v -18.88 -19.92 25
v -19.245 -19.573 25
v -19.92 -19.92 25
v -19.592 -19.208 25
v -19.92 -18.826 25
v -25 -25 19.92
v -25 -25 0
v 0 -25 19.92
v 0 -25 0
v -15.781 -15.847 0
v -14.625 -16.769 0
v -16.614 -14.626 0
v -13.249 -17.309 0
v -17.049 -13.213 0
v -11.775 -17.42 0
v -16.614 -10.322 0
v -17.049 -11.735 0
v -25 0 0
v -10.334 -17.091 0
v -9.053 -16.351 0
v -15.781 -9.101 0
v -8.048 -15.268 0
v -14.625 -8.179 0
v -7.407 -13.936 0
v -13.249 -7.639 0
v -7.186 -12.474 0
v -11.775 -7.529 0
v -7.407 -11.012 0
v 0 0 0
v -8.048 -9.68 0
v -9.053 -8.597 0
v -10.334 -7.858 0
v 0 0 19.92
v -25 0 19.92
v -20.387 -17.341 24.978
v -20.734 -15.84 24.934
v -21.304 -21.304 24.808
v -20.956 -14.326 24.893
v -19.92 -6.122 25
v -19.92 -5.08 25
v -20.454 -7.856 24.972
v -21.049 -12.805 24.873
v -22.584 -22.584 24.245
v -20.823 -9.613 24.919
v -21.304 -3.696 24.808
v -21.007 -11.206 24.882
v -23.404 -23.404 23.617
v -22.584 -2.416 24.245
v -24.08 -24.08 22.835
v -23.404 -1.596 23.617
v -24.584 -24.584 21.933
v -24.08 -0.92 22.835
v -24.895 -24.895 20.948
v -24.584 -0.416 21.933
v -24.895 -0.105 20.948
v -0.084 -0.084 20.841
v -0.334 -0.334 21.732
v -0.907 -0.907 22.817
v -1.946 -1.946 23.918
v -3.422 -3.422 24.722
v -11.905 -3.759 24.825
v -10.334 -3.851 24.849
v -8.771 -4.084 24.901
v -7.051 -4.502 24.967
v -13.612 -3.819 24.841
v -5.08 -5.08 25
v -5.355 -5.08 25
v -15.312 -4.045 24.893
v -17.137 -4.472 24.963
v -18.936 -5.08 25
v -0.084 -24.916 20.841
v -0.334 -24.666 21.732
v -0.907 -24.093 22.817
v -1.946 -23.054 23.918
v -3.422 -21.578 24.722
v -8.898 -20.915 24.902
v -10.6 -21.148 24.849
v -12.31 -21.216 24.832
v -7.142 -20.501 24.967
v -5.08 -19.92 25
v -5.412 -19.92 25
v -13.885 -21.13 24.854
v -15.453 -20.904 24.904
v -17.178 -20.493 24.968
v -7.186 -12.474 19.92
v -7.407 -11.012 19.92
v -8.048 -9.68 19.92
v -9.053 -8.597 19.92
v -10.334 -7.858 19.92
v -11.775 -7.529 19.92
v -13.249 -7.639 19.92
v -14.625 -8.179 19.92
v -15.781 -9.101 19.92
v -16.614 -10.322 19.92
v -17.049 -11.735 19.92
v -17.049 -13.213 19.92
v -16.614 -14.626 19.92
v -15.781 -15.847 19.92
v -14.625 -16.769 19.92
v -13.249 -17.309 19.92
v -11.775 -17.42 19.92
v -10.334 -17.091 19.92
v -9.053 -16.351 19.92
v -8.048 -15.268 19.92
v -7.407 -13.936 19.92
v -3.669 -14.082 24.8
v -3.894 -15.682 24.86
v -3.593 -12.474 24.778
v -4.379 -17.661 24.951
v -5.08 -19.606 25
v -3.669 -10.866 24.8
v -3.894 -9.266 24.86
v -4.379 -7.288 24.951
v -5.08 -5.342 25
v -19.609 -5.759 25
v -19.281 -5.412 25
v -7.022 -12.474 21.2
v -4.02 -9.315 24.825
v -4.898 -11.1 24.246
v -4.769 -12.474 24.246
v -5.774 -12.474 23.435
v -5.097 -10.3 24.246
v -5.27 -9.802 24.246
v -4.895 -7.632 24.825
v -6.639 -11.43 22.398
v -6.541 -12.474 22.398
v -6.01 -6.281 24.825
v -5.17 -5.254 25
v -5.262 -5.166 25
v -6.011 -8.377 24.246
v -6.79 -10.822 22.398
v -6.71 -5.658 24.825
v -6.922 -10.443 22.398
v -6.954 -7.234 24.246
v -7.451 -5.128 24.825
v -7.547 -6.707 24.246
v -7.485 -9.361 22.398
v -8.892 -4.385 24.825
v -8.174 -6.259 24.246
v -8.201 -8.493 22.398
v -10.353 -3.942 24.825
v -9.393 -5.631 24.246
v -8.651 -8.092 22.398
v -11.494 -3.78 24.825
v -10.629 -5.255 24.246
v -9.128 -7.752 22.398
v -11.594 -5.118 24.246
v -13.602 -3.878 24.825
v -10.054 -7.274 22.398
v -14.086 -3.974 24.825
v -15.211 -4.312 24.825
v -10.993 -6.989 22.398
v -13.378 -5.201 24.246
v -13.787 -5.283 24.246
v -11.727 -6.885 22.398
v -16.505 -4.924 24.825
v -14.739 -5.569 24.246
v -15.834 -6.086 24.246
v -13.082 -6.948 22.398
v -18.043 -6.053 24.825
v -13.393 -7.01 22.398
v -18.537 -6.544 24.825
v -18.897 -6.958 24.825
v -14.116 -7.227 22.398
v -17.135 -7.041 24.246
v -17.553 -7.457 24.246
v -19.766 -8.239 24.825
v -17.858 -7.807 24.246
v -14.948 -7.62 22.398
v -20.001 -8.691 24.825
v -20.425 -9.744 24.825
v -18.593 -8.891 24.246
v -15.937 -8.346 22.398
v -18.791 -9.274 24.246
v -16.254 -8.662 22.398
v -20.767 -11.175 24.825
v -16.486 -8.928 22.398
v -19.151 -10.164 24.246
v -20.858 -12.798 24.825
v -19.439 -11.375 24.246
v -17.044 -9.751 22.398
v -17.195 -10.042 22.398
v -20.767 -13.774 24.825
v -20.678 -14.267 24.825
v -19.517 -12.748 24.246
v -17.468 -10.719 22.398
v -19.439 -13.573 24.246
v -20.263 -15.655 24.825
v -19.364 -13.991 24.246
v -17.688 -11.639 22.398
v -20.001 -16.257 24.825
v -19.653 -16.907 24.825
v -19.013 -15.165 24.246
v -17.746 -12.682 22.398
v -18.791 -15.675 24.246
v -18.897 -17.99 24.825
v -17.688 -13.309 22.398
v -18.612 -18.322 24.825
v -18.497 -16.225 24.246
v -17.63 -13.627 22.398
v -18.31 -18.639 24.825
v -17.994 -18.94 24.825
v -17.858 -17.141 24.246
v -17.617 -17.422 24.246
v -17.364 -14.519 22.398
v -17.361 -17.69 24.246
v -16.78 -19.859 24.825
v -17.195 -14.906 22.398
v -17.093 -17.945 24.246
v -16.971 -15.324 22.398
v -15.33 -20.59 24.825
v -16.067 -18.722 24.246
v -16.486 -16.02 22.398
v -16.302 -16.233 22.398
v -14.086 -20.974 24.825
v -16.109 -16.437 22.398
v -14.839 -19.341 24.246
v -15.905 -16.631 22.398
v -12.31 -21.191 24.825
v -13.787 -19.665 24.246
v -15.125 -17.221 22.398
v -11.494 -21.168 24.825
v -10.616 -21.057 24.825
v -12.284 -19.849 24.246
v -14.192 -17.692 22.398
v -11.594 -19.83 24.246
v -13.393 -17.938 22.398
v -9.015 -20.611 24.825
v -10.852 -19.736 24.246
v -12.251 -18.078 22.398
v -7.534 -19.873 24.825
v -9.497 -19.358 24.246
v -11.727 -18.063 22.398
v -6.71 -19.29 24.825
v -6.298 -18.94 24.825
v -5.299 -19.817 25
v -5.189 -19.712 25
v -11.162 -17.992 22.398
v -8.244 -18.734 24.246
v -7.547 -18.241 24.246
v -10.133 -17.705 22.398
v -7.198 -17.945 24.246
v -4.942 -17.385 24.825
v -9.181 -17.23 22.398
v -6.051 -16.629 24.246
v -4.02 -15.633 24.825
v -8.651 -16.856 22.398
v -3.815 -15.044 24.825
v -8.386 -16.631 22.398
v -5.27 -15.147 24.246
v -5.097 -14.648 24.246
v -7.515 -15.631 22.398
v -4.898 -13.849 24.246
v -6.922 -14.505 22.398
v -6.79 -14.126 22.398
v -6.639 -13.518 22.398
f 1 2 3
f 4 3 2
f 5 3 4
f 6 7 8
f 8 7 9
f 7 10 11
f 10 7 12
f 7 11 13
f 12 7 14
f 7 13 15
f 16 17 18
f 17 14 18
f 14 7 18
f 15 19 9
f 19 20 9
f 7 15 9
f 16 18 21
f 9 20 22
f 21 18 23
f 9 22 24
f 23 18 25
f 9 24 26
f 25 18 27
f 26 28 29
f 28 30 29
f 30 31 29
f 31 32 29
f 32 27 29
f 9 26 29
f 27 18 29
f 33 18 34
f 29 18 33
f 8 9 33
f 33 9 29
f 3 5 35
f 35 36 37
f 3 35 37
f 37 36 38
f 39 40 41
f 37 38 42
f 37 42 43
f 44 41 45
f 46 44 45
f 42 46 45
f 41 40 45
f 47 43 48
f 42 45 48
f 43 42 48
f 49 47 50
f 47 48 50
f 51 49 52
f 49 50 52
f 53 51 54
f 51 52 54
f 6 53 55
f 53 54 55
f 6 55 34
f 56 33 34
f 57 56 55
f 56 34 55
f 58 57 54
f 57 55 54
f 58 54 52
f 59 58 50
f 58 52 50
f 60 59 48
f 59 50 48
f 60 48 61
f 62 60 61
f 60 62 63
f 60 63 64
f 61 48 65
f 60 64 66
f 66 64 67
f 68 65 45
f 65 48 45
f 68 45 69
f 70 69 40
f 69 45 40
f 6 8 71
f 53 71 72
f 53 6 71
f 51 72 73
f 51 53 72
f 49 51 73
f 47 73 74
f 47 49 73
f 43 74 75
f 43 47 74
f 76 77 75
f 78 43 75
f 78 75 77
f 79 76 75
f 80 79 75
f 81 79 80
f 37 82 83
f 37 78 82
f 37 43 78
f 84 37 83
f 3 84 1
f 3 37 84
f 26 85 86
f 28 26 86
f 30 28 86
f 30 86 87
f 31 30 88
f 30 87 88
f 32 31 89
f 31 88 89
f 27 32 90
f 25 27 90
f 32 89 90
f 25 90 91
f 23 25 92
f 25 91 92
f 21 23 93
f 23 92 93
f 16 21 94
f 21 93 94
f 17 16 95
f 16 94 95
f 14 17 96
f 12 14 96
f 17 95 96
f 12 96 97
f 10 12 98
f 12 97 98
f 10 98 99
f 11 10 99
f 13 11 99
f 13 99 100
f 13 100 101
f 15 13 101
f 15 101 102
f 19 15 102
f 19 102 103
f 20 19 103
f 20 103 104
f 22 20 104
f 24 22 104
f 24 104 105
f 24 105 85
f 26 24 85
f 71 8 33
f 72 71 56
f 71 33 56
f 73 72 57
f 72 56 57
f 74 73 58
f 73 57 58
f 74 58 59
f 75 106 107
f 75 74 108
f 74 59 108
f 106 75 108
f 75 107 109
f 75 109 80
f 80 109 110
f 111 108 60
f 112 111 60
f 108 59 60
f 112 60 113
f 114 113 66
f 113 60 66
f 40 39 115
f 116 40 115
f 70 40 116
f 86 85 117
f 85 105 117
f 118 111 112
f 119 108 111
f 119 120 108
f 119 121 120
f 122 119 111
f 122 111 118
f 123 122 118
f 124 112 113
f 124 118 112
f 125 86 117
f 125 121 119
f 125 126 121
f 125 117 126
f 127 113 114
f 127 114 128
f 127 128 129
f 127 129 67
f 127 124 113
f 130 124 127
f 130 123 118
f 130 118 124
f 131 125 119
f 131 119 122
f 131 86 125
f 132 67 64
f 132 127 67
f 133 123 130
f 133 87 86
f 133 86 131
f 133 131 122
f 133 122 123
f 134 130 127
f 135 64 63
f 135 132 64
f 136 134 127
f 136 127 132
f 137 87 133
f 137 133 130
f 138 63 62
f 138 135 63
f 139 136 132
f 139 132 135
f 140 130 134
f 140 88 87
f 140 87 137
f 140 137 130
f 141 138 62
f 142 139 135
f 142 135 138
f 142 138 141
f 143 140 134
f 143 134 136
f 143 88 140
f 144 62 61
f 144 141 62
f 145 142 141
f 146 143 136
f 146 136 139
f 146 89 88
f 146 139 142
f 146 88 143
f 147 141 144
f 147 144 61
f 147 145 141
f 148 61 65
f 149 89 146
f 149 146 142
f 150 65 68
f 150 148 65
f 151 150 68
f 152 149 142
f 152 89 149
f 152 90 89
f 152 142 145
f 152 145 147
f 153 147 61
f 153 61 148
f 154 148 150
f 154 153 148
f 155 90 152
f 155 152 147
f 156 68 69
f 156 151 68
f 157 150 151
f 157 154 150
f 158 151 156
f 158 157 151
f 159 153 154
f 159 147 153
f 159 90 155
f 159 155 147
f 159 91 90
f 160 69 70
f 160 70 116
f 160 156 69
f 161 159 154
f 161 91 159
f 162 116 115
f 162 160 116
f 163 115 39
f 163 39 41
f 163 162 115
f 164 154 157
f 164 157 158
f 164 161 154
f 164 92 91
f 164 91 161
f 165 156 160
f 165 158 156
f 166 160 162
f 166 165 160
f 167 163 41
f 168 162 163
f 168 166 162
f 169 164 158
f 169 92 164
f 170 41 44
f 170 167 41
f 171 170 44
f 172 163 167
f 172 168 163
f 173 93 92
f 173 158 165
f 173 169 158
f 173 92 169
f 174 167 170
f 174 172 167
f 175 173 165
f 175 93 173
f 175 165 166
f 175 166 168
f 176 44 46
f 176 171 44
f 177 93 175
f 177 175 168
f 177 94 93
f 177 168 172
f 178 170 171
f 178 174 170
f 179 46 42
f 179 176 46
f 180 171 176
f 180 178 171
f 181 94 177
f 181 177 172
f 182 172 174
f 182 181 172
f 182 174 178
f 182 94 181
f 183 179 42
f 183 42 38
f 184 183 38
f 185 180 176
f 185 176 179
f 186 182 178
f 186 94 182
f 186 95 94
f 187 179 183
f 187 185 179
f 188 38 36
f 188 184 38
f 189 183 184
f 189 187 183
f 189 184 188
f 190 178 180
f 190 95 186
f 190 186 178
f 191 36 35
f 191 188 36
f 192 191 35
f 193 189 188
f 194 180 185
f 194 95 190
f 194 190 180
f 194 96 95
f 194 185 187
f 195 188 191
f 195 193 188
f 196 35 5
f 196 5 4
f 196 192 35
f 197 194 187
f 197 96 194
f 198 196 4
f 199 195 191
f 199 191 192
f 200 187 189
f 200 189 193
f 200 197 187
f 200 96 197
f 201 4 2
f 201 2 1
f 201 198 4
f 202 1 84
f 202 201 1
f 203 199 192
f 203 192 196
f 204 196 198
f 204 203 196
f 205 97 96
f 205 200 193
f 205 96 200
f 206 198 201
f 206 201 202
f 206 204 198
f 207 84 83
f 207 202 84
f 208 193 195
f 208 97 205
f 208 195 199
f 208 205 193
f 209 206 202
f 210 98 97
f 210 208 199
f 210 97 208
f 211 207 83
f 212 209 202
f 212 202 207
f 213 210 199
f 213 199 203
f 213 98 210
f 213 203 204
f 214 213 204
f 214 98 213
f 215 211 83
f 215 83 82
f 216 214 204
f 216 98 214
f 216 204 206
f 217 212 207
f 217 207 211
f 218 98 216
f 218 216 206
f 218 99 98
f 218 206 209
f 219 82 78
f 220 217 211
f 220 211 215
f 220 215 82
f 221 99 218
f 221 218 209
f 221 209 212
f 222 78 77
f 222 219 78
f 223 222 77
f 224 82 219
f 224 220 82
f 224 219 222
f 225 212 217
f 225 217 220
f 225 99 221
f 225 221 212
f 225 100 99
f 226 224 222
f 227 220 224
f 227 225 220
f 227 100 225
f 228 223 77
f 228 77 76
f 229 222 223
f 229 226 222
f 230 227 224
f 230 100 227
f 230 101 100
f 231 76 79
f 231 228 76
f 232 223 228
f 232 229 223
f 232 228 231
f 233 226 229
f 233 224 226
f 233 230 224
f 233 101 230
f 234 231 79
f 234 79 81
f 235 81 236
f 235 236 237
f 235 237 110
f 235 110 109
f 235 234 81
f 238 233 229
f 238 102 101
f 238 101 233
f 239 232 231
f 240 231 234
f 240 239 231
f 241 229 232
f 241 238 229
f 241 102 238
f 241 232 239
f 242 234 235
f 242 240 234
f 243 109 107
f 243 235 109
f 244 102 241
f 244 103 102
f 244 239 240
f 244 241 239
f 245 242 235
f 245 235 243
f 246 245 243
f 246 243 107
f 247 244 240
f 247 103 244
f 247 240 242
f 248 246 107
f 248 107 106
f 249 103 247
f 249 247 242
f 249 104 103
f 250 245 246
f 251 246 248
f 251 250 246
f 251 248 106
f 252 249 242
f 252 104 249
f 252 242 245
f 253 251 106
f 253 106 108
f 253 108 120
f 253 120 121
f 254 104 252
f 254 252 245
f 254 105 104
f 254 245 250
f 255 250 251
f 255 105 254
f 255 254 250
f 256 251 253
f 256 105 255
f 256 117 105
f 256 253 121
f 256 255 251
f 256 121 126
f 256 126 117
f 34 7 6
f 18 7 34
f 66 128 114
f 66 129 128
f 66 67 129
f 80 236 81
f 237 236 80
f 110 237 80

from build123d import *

# Parameters (mm, degrees)
F0_W        = 25
F0_H        = 25
F1_DEPTH    = 25
F2_R        = 4.9593089968
F3_DEPTH    = 25.4
F4_T1_DEPTH = 50.4
F4_T3_DEPTH = 50.4


# Not quite as in the source:
# - a fillet or chamfer that OpenCascade refuses, or shapes differently, is made with other operations: its cross-section is extruded or revolved along the edge and cut away or added


with BuildPart() as f1:
    # F0 (on Top) → F1 (new body)
    with BuildSketch(Plane.XY):
        with Locations((-12.5, -12.5)):
            Rectangle(F0_W, F0_H)
    extrude(amount=F1_DEPTH)

    # F2 (on face) → F3 (cut)
    with BuildSketch(Plane.XY.offset(25)):
        with Locations((-12.1455704793, -12.4741084874)):
            Circle(F2_R)
    extrude(amount=-F3_DEPTH, mode=Mode.SUBTRACT)

    # F4: fillet of radius 5.08 on 5 edges, made by hand

    # F4_s2 → F4_t1 (cut)
    with BuildSketch(Plane.XZ.offset(-12.7)):
        with BuildLine():
            ThreePointArc((0, 19.92), (-1.4878975516, 23.5121024484), (-5.08, 25))
            Line((-5.08, 25), (0, 25))
            Line((0, 25), (0, 19.92))
        make_face()
        with BuildLine():
            ThreePointArc((-19.92, 25), (-23.5121024484, 23.5121024484), (-25, 19.92))
            Line((-25, 19.92), (-25, 25))
            Line((-25, 25), (-19.92, 25))
        make_face()
    extrude(amount=F4_T1_DEPTH, mode=Mode.SUBTRACT)

    # F4_s4 → F4_t3 (cut)
    with BuildSketch(Plane.YZ.offset(-37.7)):
        with BuildLine():
            ThreePointArc((-25, 19.92), (-23.5121024484, 23.5121024484), (-19.92, 25))
            Line((-19.92, 25), (-25, 25))
            Line((-25, 25), (-25, 19.92))
        make_face()
        with BuildLine():
            ThreePointArc((0, 19.92), (-1.4878975516, 23.5121024484), (-5.08, 25))
            Line((-5.08, 25), (0, 25))
            Line((0, 25), (0, 19.92))
        make_face()
    extrude(amount=F4_T3_DEPTH, mode=Mode.SUBTRACT)

    # F4_s5 → F4_t6 (revolve, cut)
    with BuildSketch(Plane.XZ.offset(12.4741084874)):
        with BuildLine():
            ThreePointArc((-2.1062614826, 25), (-5.698363931, 23.5121024484), (-7.1862614826, 19.92))
            Line((-7.1862614826, 19.92), (-7.1862614826, 25))
            Line((-7.1862614826, 25), (-2.1062614826, 25))
        make_face()
    revolve(axis=Axis((-12.1455704793, -12.4741084874, 25), (0, 0, 1)), mode=Mode.SUBTRACT)


solid = f1.part
